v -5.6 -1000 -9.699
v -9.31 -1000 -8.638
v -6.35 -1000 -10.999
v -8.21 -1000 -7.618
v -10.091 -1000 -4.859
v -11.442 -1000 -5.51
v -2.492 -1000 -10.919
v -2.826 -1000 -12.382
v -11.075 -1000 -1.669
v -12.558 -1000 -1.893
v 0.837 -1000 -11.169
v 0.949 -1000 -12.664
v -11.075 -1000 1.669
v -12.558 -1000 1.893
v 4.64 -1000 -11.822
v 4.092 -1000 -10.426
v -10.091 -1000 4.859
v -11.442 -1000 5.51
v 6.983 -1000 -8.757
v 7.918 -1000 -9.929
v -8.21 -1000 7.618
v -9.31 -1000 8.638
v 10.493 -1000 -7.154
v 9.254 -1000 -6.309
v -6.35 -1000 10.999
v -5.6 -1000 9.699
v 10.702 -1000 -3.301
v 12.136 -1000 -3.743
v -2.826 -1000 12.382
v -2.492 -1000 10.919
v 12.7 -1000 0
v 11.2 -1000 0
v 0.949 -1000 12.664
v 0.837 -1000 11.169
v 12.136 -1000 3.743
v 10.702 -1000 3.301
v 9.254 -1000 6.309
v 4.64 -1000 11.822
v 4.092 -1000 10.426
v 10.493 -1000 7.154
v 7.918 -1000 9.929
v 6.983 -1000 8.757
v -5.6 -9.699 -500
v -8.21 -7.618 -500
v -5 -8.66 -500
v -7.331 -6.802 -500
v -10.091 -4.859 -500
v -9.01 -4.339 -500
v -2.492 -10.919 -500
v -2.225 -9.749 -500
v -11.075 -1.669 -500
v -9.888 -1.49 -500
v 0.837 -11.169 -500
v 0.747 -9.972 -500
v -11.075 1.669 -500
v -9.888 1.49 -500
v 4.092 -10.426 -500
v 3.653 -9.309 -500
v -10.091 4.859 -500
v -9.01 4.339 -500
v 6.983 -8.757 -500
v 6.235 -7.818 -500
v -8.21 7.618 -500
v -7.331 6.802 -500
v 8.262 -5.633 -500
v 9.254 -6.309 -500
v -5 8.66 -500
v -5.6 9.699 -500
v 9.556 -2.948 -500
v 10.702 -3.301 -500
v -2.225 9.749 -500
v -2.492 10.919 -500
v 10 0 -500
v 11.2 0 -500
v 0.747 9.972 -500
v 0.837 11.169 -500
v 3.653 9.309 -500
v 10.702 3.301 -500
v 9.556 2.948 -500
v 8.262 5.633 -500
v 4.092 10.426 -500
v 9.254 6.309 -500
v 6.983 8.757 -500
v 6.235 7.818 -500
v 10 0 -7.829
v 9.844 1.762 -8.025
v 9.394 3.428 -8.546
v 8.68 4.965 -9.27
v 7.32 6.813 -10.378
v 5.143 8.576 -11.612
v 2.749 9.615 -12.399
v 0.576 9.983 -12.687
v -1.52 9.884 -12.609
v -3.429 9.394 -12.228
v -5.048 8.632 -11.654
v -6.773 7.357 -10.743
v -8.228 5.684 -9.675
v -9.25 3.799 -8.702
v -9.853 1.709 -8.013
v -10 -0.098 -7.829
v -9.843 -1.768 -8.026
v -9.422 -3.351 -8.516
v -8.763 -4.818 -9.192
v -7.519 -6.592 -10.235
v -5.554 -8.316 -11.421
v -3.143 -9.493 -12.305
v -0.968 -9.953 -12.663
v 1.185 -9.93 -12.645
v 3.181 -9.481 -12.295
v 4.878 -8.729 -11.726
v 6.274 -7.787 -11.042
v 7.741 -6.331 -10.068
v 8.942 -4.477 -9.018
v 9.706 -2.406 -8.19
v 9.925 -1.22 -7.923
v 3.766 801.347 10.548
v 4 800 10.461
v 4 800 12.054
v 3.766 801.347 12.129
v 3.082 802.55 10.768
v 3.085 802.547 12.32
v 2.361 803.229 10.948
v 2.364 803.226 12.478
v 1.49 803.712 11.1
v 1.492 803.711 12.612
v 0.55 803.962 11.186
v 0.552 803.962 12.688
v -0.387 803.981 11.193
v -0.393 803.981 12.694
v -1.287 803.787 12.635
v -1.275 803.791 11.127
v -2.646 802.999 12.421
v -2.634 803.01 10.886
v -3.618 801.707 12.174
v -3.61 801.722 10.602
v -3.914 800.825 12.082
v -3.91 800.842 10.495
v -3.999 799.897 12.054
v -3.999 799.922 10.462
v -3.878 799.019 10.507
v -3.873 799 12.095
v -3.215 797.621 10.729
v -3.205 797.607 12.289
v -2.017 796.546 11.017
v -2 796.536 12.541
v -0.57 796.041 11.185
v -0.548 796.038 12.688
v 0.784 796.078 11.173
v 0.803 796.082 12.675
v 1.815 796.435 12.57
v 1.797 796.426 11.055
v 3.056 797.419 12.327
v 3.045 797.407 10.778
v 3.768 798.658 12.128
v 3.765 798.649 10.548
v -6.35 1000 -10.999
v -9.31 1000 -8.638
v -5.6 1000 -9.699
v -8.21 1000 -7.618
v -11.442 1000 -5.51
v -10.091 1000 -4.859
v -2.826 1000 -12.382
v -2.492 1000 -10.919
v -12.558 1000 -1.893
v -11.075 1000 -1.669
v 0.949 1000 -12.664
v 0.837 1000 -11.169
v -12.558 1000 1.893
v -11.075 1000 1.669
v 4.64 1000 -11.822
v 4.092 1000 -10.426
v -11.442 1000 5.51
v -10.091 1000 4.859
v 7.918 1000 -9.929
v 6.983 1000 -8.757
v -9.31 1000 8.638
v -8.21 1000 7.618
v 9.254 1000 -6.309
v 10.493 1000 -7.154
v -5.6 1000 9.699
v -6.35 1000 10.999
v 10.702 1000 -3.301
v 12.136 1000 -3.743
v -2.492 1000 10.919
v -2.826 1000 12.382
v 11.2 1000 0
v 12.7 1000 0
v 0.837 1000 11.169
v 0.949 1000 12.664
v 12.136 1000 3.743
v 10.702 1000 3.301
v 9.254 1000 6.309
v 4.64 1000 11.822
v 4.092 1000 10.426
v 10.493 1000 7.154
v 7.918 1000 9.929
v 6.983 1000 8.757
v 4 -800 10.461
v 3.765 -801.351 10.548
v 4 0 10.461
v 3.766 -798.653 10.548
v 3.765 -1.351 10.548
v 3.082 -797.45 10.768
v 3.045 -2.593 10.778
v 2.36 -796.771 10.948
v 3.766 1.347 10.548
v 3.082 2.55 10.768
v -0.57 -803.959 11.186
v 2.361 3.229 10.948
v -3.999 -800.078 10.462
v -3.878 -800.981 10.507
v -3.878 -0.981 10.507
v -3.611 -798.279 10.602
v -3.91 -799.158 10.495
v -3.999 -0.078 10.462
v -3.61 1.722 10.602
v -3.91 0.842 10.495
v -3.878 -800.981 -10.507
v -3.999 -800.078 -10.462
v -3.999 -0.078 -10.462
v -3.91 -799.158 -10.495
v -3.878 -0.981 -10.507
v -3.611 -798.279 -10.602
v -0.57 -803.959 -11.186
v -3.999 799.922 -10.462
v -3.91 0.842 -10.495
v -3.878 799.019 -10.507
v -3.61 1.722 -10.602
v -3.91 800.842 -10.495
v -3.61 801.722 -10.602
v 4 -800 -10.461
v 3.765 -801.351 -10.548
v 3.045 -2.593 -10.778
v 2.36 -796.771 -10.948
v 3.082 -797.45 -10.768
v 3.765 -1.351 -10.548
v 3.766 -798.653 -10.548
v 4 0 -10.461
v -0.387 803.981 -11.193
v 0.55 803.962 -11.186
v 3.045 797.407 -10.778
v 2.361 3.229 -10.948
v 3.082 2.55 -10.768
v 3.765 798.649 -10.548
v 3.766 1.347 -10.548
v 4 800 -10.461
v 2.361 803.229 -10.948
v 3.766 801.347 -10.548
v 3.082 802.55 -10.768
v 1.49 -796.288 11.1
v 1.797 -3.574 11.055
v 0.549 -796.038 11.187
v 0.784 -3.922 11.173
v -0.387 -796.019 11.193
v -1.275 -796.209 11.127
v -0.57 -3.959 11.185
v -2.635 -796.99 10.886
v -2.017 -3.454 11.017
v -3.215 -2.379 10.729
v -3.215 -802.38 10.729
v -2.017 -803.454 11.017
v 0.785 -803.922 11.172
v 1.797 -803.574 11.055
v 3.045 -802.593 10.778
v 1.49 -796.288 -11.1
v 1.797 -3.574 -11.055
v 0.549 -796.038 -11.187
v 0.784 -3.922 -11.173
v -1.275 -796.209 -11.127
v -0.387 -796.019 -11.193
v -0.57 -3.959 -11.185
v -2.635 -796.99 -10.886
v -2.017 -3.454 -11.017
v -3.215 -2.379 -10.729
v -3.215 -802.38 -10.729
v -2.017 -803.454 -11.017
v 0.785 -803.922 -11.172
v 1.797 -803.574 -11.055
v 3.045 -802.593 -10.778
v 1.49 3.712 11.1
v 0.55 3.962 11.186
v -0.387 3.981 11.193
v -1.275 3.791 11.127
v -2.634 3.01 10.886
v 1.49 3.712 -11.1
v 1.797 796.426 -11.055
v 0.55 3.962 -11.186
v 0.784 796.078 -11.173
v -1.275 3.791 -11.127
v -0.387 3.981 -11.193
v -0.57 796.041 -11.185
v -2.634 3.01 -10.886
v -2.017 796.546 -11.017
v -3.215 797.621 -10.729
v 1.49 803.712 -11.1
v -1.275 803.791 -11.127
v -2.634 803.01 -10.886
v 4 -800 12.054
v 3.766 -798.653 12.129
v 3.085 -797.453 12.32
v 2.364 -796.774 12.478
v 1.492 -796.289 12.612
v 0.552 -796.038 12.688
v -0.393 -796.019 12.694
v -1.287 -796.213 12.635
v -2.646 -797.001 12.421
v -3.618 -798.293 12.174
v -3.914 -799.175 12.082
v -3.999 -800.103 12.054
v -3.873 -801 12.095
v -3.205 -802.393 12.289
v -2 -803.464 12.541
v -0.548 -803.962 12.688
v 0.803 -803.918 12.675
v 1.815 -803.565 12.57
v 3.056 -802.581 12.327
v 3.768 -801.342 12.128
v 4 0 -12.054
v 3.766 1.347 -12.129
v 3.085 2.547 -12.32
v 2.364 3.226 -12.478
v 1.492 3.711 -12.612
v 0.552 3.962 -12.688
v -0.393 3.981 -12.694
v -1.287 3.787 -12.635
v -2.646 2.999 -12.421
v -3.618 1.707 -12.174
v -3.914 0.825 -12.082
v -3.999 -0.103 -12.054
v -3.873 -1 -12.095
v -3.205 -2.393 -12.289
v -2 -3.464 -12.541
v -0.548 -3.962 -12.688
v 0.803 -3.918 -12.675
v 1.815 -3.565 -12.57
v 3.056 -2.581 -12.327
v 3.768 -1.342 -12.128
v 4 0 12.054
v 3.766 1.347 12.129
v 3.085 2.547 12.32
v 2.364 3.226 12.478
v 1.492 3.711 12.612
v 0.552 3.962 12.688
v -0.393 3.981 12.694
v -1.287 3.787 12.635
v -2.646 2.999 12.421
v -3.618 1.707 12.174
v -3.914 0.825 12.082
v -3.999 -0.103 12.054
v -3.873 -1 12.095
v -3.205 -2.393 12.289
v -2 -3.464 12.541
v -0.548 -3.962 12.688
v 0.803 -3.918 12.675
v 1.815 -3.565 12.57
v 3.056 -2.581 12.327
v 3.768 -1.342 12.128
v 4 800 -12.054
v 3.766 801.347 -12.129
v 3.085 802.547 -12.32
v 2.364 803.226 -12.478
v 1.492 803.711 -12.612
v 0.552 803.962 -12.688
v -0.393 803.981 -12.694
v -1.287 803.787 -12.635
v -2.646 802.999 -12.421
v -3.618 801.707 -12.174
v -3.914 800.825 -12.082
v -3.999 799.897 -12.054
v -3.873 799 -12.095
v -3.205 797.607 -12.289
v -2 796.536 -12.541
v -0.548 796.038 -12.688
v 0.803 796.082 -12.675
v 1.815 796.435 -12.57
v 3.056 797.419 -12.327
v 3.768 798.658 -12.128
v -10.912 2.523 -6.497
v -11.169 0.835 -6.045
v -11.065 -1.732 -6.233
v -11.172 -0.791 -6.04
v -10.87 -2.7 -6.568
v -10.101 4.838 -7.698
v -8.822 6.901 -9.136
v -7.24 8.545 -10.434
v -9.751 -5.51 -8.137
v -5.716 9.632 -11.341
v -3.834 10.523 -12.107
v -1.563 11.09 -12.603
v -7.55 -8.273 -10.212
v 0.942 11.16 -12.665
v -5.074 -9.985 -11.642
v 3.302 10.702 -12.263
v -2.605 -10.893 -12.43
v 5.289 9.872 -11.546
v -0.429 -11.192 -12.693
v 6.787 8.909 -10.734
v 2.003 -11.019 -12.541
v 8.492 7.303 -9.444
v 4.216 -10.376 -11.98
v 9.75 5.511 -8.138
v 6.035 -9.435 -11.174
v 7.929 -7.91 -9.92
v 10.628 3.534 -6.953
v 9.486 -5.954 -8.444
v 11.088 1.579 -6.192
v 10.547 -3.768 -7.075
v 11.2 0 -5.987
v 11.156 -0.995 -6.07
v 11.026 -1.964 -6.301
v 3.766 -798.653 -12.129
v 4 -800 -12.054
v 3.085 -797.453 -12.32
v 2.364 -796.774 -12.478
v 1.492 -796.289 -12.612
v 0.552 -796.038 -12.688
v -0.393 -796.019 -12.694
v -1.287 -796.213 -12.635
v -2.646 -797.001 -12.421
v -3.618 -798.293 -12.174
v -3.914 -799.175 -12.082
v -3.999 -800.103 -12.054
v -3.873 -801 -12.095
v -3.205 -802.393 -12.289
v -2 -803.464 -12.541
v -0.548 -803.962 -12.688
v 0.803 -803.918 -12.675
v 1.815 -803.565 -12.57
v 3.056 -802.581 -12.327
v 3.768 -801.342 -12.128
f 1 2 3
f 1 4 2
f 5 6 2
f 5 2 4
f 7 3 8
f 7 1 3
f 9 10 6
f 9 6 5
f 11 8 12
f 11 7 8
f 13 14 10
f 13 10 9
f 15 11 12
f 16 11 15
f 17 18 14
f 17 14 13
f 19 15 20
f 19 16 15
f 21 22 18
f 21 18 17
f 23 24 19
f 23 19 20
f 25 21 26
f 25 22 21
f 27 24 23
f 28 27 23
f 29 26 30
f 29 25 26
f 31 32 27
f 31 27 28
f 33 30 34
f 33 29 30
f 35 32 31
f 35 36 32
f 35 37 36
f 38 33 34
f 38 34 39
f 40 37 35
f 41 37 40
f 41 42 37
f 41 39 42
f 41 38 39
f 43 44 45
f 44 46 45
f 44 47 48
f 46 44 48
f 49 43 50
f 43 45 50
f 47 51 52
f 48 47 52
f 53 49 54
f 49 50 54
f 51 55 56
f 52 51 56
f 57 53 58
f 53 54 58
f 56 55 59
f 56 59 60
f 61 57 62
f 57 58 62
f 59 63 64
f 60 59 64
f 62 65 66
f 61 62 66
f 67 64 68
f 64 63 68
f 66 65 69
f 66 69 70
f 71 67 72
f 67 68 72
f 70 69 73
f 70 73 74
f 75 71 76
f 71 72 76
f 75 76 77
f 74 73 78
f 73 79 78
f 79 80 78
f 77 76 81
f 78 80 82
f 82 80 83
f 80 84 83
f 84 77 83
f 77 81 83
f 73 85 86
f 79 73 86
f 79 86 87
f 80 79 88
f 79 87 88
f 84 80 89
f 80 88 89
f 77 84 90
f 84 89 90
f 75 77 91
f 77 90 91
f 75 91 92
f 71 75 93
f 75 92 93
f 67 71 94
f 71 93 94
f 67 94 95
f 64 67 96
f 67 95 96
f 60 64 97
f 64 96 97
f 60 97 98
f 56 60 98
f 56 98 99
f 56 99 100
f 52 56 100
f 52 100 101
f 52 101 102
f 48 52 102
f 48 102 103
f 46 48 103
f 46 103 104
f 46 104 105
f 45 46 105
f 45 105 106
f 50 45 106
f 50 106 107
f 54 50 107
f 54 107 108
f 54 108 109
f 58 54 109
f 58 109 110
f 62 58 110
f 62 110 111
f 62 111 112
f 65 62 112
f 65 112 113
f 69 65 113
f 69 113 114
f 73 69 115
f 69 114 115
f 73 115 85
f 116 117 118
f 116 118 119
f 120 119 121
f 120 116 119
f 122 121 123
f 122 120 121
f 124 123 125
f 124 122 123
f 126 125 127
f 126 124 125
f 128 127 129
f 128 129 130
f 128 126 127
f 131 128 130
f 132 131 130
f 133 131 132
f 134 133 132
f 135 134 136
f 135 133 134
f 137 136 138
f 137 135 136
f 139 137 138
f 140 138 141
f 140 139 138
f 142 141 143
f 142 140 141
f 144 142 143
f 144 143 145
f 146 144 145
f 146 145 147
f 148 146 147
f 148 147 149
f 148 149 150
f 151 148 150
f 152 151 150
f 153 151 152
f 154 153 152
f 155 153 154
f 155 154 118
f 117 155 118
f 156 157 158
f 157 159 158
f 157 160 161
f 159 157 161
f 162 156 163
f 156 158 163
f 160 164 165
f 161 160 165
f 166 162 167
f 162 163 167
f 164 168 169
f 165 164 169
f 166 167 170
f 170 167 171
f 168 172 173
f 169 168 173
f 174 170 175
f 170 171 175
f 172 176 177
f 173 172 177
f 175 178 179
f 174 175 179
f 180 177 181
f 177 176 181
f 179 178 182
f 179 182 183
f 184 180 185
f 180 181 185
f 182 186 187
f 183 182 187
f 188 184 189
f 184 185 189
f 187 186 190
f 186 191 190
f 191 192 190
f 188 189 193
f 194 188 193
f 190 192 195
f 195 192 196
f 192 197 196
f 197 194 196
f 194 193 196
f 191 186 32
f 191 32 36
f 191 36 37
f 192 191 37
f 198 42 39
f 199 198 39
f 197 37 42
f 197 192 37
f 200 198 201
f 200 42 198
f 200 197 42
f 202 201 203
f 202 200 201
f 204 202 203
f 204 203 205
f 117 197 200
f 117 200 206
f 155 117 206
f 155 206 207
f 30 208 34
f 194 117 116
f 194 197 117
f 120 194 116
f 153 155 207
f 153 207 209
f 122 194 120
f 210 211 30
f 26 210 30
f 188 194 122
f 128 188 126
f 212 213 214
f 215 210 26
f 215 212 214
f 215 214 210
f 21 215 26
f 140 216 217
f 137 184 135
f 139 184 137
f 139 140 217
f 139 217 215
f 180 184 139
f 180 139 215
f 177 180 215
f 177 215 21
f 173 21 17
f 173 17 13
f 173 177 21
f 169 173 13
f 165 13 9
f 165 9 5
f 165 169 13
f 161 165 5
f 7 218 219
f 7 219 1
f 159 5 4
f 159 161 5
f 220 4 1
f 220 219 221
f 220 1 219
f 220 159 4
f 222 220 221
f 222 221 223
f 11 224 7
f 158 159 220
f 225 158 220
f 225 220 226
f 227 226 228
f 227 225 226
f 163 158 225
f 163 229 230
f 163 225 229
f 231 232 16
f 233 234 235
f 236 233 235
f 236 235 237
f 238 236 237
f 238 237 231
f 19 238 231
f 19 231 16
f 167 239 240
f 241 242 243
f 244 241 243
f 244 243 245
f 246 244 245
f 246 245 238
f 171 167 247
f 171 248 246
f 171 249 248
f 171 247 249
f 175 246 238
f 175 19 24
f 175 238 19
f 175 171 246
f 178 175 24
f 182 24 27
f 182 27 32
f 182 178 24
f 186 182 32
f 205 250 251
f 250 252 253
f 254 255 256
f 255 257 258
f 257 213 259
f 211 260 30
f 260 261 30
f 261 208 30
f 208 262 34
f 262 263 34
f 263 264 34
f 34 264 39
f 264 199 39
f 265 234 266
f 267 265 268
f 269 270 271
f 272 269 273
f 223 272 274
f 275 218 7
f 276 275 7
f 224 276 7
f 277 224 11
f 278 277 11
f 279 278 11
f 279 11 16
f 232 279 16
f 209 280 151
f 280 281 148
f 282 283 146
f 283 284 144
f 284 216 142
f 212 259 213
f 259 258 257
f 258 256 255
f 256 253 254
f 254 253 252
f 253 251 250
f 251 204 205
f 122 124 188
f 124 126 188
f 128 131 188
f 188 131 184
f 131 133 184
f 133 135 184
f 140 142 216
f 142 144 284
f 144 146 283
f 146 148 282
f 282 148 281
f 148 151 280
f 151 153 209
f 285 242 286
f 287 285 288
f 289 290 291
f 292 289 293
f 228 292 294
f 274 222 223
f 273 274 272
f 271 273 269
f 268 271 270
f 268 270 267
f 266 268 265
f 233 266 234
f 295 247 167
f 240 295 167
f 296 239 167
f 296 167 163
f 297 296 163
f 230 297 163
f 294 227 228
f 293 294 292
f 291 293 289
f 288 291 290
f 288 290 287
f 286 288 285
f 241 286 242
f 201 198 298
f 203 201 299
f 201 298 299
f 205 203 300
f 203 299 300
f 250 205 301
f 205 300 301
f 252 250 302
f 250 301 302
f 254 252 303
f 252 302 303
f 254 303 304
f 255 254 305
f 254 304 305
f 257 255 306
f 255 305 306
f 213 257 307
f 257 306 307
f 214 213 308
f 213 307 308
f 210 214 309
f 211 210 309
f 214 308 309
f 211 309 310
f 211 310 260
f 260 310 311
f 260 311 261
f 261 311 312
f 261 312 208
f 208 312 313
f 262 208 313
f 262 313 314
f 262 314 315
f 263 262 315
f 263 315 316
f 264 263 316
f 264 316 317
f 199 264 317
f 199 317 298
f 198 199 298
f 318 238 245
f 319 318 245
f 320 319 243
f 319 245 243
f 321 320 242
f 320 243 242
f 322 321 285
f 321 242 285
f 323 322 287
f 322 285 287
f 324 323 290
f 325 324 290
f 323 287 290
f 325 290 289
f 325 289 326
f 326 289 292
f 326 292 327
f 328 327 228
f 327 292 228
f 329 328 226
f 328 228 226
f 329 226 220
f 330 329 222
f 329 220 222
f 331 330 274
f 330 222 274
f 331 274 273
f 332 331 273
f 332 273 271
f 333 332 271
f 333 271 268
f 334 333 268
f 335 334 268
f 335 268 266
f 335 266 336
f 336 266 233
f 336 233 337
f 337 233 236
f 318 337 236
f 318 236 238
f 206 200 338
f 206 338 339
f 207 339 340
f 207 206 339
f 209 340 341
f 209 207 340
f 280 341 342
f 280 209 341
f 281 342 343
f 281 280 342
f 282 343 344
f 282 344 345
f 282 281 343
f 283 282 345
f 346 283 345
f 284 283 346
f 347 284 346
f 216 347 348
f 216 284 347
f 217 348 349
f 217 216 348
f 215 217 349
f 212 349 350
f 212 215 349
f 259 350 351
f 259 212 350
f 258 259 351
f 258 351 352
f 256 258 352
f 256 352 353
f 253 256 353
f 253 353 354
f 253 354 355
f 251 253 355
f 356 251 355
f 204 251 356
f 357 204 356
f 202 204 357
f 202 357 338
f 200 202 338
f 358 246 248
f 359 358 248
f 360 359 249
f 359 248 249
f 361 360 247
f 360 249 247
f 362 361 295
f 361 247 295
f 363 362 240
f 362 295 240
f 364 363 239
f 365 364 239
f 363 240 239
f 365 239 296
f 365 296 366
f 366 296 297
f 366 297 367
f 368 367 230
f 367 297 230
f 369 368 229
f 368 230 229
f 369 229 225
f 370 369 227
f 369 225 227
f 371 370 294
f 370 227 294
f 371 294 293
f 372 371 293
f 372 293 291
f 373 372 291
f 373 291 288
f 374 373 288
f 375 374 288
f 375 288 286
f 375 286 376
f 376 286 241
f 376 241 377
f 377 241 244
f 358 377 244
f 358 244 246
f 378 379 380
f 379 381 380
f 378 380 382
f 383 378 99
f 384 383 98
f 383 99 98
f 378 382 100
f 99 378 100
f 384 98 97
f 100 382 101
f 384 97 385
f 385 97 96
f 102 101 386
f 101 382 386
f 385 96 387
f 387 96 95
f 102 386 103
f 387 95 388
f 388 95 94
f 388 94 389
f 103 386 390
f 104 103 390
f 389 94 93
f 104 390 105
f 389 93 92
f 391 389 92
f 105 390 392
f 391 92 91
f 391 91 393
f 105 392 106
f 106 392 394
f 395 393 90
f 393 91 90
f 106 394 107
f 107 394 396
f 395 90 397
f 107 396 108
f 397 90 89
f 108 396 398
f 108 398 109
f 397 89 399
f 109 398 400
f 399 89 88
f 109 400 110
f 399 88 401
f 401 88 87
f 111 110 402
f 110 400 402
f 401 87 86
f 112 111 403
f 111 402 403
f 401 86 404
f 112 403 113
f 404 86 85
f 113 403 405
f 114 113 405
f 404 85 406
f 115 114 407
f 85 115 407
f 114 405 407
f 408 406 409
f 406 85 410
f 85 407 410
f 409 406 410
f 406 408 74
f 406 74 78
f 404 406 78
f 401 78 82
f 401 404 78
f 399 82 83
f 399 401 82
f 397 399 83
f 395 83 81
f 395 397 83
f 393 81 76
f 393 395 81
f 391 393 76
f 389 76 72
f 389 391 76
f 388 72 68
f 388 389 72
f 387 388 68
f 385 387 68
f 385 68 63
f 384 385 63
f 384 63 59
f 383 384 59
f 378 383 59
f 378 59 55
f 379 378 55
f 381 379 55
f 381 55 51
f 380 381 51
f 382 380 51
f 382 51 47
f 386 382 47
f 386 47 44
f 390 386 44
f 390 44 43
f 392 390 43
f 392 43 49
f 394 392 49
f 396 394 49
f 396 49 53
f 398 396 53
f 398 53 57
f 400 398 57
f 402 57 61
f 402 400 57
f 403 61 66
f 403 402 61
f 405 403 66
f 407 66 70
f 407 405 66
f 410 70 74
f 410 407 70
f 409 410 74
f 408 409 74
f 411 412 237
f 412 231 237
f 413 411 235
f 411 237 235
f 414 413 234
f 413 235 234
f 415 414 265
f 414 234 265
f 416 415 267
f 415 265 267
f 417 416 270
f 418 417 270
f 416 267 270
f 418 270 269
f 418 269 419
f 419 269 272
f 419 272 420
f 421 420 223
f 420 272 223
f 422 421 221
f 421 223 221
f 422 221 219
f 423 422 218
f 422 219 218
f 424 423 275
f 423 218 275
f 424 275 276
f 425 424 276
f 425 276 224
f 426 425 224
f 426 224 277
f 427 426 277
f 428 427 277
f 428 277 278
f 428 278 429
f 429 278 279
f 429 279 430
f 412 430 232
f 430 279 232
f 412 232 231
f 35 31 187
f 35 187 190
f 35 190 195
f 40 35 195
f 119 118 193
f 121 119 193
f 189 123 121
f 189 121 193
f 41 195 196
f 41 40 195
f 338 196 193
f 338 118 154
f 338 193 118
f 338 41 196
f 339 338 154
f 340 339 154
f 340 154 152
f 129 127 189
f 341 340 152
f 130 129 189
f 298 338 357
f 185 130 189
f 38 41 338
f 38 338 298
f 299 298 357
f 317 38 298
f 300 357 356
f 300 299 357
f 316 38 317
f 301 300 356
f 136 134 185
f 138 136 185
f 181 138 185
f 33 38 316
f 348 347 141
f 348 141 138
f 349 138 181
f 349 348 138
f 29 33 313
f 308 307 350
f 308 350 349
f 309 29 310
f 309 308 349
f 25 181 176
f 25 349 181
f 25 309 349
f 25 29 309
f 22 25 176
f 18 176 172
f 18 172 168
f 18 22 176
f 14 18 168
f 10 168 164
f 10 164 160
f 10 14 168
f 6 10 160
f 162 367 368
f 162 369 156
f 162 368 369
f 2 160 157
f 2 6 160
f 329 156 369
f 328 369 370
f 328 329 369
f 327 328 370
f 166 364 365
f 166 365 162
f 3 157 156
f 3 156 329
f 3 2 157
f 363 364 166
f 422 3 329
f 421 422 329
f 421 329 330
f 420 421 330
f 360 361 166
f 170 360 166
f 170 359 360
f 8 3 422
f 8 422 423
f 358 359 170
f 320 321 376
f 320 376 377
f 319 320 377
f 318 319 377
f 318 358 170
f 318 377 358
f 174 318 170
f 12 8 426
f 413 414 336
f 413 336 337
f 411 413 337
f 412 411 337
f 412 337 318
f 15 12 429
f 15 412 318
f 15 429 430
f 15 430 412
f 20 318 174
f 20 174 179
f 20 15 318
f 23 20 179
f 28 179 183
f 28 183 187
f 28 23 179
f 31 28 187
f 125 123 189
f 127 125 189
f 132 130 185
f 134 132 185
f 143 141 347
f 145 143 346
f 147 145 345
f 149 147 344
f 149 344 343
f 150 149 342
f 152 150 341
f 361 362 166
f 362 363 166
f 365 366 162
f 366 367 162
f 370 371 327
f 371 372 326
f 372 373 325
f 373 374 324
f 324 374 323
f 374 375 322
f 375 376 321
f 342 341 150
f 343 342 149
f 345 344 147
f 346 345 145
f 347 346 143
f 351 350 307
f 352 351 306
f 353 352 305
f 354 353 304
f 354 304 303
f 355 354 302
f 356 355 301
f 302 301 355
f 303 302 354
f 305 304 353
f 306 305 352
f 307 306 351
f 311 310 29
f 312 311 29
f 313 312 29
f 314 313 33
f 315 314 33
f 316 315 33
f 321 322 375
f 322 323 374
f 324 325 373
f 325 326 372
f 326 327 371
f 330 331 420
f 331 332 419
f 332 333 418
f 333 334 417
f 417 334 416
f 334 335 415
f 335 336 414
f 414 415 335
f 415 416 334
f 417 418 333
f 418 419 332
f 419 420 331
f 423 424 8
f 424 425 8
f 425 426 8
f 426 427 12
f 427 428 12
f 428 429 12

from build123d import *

# Parameters (mm, degrees)
F0_R     = 12.7
F0_R_2   = 11.2
F1_DEPTH = 1000
F2_R     = 11.2
F2_R_2   = 10
F3_DEPTH = 500
F4_R     = 12.7
F5_DEPTH = 12.5
F6_R     = 4
F7_DEPTH = 15


with BuildPart() as f1:
    # F0 (on Front) → F1 (new body, symmetric)
    with BuildSketch(Plane.XZ):
        Circle(F0_R)
        Circle(F0_R_2, mode=Mode.SUBTRACT)
    extrude(amount=F1_DEPTH, both=True)

    # F6 (on Top) → F7 (cut, symmetric)
    with BuildSketch(Plane.XY):
        Circle(F6_R)
        with Locations((0, 800)):
            Circle(F6_R)
        with Locations((0, -800)):
            Circle(F6_R)
    extrude(amount=F7_DEPTH, both=True, mode=Mode.SUBTRACT)


with BuildPart() as f3:
    # F2 (on Top) → F3 (new body)
    with BuildSketch(Plane.XY):
        Circle(F2_R)
        Circle(F2_R_2, mode=Mode.SUBTRACT)
    extrude(amount=-F3_DEPTH)

    # F4 (on Front) → F5 (cut, symmetric)
    with BuildSketch(Plane.XZ):
        Circle(F4_R)
    extrude(amount=F5_DEPTH, both=True, mode=Mode.SUBTRACT)


solid = Compound([f1.part, f3.part])
